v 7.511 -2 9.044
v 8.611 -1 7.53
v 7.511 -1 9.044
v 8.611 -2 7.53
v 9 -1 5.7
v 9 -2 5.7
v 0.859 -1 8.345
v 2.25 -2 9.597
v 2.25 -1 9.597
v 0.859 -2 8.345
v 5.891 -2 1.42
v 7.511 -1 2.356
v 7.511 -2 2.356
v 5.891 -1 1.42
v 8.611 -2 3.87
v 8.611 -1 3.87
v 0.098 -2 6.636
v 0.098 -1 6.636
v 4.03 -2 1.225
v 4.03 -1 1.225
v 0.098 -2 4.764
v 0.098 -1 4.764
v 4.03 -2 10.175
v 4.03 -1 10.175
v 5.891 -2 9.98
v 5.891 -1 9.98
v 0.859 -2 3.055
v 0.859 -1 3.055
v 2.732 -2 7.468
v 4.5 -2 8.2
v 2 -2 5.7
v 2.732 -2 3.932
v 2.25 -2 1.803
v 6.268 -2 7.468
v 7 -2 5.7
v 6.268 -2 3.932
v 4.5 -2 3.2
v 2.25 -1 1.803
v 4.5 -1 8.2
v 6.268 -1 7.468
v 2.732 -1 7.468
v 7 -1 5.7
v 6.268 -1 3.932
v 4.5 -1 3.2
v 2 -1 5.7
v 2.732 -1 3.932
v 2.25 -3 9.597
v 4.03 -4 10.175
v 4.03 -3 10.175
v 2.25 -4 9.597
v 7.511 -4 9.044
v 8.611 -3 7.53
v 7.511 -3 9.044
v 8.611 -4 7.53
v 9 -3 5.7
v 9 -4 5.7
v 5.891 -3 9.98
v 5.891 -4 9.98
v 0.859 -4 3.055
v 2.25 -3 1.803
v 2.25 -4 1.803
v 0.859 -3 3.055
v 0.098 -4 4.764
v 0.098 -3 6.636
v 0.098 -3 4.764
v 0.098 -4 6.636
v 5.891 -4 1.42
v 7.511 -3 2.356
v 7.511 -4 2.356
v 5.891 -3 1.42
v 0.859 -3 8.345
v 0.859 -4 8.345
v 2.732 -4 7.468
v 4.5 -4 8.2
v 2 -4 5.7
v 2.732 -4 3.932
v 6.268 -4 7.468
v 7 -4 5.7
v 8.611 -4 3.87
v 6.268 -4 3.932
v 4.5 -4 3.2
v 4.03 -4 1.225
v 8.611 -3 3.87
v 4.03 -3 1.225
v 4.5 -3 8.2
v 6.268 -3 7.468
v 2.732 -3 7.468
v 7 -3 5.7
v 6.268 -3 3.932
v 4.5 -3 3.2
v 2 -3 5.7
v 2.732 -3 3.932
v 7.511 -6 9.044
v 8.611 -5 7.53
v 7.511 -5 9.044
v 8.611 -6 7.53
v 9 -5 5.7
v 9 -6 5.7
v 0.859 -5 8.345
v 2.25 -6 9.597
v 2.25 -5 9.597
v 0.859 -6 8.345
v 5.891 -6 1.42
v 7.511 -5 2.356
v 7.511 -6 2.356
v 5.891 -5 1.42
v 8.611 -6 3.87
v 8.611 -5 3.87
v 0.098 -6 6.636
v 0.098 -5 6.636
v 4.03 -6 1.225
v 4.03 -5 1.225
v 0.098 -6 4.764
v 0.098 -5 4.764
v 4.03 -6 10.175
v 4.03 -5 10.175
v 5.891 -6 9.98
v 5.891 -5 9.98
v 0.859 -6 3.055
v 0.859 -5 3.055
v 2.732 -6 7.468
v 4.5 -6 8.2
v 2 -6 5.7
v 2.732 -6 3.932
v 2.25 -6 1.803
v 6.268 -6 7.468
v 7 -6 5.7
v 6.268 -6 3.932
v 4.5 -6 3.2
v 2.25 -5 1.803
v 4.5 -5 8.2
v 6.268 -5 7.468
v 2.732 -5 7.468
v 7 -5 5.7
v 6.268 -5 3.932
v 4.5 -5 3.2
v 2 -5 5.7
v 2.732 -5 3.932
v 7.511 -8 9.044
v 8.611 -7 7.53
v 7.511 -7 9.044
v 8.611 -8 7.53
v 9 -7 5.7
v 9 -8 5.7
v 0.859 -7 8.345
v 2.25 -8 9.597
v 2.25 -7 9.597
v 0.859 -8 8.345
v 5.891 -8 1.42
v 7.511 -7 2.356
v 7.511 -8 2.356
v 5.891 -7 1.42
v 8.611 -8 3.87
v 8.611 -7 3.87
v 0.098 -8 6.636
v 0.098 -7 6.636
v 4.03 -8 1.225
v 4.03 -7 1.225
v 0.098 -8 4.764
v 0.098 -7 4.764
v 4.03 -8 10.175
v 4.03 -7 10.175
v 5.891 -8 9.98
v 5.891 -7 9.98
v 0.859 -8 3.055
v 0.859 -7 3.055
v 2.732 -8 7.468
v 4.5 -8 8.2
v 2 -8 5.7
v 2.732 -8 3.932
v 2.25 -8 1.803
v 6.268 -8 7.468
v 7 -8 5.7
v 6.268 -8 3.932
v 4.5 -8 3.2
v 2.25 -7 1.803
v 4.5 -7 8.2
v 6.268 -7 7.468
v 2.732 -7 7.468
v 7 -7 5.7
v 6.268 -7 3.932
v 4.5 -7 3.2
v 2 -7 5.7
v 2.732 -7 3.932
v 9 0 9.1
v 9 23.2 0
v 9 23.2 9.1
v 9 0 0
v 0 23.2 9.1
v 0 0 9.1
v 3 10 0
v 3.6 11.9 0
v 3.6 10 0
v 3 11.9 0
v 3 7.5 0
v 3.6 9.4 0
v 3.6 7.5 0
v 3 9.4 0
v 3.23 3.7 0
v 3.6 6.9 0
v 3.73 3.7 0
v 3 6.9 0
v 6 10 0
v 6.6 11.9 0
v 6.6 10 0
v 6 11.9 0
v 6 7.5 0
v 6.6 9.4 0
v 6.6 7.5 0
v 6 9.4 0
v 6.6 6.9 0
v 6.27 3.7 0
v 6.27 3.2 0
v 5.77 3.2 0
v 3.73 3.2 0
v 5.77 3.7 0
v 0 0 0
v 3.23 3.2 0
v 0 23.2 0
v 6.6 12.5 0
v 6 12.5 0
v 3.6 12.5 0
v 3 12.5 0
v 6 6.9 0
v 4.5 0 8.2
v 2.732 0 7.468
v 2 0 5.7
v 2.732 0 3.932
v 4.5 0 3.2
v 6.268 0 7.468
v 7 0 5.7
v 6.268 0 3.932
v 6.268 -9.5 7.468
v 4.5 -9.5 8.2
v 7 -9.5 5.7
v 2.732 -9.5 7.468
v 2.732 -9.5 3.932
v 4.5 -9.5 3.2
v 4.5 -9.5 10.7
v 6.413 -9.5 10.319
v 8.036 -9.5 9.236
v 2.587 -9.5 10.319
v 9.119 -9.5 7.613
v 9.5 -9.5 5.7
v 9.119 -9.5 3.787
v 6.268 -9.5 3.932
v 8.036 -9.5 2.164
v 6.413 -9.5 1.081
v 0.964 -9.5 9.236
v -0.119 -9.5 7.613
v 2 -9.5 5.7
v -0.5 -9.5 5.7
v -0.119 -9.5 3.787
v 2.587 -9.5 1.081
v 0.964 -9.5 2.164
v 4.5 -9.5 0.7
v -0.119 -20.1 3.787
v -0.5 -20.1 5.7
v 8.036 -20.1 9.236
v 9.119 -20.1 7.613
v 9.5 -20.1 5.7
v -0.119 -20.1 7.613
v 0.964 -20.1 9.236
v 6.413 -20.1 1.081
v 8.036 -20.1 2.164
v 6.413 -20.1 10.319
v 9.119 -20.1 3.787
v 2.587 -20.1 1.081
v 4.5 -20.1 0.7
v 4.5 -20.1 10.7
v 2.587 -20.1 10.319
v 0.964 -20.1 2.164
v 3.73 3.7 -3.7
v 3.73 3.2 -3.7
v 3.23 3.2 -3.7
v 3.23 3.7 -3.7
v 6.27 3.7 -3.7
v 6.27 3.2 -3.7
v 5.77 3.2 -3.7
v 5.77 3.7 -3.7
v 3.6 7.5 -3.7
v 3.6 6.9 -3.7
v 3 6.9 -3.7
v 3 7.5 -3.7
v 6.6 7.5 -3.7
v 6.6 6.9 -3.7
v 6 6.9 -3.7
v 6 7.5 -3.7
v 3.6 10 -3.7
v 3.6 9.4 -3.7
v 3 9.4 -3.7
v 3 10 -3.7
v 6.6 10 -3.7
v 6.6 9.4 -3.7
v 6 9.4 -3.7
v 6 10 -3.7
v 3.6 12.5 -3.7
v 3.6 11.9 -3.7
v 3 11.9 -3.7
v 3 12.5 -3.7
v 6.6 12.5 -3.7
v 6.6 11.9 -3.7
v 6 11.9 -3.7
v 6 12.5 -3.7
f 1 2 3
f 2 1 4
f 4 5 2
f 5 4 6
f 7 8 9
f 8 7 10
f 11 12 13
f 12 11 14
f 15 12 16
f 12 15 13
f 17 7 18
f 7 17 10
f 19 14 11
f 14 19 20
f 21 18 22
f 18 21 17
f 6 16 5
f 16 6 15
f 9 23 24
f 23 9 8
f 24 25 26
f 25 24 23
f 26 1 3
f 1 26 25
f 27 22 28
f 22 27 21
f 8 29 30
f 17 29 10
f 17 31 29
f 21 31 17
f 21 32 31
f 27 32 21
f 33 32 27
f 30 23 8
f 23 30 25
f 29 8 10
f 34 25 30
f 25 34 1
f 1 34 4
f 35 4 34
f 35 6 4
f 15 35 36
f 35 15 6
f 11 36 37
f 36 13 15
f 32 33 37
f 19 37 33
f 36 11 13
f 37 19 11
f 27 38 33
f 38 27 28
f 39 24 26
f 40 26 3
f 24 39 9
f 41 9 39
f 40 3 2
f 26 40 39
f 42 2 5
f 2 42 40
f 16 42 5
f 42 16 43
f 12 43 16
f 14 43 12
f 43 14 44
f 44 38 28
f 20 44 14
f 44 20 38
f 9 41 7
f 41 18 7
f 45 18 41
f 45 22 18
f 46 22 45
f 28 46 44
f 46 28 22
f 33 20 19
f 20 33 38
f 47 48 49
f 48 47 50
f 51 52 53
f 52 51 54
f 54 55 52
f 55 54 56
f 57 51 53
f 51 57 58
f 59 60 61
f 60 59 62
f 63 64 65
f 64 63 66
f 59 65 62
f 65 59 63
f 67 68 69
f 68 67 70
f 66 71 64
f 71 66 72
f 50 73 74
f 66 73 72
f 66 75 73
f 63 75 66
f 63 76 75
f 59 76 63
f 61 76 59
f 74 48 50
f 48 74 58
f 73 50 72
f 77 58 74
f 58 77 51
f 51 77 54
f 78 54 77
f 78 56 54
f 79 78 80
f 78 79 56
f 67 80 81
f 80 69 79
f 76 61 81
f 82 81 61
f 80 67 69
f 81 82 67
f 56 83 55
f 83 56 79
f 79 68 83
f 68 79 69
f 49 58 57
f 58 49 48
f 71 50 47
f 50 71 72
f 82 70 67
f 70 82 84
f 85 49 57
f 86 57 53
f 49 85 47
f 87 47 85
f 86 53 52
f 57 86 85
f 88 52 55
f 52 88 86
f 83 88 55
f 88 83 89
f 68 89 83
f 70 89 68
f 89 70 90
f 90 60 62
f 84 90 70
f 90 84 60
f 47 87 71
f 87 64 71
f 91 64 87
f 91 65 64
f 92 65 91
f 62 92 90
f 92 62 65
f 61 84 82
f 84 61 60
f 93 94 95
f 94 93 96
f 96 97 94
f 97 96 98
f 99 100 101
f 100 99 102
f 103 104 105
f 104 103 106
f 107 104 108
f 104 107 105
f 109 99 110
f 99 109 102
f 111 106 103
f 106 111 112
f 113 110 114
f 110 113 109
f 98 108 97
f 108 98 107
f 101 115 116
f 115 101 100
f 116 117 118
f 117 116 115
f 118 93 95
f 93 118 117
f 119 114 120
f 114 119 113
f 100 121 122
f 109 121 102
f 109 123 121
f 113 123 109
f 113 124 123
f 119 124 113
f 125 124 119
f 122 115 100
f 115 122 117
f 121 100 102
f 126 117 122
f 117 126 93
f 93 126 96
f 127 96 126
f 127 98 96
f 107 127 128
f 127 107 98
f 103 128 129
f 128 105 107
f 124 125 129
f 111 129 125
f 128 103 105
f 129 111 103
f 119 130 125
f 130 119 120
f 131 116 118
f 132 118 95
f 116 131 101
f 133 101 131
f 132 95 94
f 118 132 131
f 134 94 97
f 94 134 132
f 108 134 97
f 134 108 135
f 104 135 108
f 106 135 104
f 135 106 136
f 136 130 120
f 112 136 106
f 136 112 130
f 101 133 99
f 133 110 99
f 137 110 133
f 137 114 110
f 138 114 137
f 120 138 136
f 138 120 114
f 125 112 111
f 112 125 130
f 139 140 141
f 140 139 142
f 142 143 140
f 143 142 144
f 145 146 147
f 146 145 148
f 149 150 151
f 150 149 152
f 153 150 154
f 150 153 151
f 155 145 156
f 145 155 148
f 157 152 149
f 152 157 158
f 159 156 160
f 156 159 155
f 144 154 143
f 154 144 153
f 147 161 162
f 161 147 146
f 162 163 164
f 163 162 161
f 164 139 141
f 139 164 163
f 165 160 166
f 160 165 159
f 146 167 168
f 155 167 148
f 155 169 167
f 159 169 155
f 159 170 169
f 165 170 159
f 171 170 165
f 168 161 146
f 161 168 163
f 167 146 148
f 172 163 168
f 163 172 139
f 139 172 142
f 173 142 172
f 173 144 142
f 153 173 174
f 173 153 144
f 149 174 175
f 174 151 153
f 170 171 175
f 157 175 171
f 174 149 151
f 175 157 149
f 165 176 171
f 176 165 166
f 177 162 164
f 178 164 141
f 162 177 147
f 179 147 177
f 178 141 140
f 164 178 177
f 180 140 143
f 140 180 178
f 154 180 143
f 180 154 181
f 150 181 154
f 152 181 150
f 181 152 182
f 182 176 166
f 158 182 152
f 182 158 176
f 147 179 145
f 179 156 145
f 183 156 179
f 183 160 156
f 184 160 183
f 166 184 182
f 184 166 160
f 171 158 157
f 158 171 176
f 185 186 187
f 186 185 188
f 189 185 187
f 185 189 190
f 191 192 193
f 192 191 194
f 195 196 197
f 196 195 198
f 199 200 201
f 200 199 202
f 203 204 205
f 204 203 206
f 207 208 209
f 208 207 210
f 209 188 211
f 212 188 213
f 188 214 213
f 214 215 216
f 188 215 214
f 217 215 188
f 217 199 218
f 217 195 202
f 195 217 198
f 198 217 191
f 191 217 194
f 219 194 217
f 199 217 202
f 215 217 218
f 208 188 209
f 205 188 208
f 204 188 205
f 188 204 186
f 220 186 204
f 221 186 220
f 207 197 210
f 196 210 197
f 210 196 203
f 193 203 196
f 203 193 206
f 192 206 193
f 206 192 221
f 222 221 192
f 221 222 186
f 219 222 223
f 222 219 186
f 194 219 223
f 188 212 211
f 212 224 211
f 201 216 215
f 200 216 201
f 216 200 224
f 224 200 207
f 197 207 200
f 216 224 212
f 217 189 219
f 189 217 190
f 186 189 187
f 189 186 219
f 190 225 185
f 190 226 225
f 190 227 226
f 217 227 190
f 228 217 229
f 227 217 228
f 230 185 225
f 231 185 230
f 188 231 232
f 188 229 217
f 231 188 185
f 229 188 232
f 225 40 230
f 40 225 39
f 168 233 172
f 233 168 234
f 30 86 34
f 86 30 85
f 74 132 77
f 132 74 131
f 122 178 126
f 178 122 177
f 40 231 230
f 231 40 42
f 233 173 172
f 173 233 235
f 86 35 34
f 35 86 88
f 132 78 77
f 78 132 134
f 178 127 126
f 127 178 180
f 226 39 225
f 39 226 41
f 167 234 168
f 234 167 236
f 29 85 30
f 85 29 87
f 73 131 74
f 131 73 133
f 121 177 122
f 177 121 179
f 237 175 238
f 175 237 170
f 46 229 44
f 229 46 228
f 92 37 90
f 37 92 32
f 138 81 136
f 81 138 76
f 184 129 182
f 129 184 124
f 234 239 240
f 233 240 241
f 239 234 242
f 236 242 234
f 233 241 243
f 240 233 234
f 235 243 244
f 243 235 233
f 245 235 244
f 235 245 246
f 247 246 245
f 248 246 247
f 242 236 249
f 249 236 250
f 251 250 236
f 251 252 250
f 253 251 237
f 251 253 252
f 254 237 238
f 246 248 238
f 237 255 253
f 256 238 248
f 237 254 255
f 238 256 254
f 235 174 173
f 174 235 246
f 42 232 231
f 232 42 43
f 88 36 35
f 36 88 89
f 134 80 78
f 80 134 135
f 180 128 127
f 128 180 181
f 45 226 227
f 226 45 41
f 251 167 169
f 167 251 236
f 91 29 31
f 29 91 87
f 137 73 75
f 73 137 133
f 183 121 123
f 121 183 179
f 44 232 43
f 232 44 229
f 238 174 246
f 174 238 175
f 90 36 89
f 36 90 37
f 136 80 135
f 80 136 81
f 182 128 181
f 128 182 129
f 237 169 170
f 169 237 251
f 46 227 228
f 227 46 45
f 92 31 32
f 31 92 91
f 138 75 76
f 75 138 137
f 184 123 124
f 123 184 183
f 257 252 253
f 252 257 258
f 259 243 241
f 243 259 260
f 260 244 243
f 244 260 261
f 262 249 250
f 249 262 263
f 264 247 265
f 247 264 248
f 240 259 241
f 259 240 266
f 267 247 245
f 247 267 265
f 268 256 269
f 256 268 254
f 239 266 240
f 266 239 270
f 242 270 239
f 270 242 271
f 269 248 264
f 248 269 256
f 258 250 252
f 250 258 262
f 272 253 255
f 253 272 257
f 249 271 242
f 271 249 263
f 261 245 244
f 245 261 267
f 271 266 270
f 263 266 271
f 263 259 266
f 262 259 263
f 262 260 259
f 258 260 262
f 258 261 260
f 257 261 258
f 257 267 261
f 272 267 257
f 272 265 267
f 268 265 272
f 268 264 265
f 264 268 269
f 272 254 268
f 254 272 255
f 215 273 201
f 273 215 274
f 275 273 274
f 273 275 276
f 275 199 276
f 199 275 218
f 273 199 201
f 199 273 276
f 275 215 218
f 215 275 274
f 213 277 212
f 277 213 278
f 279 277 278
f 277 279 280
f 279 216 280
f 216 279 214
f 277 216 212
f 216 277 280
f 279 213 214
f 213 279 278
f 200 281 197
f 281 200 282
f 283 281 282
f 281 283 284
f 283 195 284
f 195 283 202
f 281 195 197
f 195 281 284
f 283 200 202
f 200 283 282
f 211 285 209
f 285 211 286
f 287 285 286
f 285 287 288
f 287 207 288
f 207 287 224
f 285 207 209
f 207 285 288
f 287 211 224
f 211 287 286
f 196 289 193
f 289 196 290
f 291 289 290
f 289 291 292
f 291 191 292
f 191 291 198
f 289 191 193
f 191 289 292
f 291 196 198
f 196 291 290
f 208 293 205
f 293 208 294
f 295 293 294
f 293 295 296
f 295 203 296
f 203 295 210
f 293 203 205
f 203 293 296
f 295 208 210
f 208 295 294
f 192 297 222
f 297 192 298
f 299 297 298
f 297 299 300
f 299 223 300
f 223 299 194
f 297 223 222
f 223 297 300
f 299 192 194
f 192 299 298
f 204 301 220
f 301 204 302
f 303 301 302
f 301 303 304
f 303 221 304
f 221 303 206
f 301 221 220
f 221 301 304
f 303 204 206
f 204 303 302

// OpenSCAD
// to base body
cube([9, 23.2,9.1]);

// the spring

for(i = [-1:-2:-7]){
    translate([4.5,i,5.7])
        rotate([90,0,0])
            cylinder(1, 4.5, 4.5);
}

// the rod
translate([4.5,0,5.7])
    rotate([90,0,0])
        cylinder(20.1 - 10.6,2.5, 2.5);
// the actual button
translate([4.5, -(20.1-10.6) ,5.7])
    rotate([90,0,0])
        cylinder(10.6,5, 5);

//pins
translate([4.5-2.54/2,3.2,-3.7])
cube([0.5,0.5,3.7]);

translate([4.5+2.54/2,3.2,-3.7])
cube([0.5,0.5,3.7]);

translate([4.5-3/2,3.2 + 3.7,-3.7])
cube([0.6,0.6,3.7]);

translate([4.5+3/2,3.2 + 3.7,-3.7])
cube([0.6,0.6,3.7]);

translate([4.5-3/2,3.2 + 3.7 + 2.5,-3.7])
cube([0.6,0.6,3.7]);

translate([4.5+3/2,3.2 + 3.7 + 2.5,-3.7])
cube([0.6,0.6,3.7]);

translate([4.5-3/2,3.2 + 3.7 + 2.5*2,-3.7])
cube([0.6,0.6,3.7]);

translate([4.5+3/2,3.2 + 3.7 + 2.5*2,-3.7])
cube([0.6,0.6,3.7]);
